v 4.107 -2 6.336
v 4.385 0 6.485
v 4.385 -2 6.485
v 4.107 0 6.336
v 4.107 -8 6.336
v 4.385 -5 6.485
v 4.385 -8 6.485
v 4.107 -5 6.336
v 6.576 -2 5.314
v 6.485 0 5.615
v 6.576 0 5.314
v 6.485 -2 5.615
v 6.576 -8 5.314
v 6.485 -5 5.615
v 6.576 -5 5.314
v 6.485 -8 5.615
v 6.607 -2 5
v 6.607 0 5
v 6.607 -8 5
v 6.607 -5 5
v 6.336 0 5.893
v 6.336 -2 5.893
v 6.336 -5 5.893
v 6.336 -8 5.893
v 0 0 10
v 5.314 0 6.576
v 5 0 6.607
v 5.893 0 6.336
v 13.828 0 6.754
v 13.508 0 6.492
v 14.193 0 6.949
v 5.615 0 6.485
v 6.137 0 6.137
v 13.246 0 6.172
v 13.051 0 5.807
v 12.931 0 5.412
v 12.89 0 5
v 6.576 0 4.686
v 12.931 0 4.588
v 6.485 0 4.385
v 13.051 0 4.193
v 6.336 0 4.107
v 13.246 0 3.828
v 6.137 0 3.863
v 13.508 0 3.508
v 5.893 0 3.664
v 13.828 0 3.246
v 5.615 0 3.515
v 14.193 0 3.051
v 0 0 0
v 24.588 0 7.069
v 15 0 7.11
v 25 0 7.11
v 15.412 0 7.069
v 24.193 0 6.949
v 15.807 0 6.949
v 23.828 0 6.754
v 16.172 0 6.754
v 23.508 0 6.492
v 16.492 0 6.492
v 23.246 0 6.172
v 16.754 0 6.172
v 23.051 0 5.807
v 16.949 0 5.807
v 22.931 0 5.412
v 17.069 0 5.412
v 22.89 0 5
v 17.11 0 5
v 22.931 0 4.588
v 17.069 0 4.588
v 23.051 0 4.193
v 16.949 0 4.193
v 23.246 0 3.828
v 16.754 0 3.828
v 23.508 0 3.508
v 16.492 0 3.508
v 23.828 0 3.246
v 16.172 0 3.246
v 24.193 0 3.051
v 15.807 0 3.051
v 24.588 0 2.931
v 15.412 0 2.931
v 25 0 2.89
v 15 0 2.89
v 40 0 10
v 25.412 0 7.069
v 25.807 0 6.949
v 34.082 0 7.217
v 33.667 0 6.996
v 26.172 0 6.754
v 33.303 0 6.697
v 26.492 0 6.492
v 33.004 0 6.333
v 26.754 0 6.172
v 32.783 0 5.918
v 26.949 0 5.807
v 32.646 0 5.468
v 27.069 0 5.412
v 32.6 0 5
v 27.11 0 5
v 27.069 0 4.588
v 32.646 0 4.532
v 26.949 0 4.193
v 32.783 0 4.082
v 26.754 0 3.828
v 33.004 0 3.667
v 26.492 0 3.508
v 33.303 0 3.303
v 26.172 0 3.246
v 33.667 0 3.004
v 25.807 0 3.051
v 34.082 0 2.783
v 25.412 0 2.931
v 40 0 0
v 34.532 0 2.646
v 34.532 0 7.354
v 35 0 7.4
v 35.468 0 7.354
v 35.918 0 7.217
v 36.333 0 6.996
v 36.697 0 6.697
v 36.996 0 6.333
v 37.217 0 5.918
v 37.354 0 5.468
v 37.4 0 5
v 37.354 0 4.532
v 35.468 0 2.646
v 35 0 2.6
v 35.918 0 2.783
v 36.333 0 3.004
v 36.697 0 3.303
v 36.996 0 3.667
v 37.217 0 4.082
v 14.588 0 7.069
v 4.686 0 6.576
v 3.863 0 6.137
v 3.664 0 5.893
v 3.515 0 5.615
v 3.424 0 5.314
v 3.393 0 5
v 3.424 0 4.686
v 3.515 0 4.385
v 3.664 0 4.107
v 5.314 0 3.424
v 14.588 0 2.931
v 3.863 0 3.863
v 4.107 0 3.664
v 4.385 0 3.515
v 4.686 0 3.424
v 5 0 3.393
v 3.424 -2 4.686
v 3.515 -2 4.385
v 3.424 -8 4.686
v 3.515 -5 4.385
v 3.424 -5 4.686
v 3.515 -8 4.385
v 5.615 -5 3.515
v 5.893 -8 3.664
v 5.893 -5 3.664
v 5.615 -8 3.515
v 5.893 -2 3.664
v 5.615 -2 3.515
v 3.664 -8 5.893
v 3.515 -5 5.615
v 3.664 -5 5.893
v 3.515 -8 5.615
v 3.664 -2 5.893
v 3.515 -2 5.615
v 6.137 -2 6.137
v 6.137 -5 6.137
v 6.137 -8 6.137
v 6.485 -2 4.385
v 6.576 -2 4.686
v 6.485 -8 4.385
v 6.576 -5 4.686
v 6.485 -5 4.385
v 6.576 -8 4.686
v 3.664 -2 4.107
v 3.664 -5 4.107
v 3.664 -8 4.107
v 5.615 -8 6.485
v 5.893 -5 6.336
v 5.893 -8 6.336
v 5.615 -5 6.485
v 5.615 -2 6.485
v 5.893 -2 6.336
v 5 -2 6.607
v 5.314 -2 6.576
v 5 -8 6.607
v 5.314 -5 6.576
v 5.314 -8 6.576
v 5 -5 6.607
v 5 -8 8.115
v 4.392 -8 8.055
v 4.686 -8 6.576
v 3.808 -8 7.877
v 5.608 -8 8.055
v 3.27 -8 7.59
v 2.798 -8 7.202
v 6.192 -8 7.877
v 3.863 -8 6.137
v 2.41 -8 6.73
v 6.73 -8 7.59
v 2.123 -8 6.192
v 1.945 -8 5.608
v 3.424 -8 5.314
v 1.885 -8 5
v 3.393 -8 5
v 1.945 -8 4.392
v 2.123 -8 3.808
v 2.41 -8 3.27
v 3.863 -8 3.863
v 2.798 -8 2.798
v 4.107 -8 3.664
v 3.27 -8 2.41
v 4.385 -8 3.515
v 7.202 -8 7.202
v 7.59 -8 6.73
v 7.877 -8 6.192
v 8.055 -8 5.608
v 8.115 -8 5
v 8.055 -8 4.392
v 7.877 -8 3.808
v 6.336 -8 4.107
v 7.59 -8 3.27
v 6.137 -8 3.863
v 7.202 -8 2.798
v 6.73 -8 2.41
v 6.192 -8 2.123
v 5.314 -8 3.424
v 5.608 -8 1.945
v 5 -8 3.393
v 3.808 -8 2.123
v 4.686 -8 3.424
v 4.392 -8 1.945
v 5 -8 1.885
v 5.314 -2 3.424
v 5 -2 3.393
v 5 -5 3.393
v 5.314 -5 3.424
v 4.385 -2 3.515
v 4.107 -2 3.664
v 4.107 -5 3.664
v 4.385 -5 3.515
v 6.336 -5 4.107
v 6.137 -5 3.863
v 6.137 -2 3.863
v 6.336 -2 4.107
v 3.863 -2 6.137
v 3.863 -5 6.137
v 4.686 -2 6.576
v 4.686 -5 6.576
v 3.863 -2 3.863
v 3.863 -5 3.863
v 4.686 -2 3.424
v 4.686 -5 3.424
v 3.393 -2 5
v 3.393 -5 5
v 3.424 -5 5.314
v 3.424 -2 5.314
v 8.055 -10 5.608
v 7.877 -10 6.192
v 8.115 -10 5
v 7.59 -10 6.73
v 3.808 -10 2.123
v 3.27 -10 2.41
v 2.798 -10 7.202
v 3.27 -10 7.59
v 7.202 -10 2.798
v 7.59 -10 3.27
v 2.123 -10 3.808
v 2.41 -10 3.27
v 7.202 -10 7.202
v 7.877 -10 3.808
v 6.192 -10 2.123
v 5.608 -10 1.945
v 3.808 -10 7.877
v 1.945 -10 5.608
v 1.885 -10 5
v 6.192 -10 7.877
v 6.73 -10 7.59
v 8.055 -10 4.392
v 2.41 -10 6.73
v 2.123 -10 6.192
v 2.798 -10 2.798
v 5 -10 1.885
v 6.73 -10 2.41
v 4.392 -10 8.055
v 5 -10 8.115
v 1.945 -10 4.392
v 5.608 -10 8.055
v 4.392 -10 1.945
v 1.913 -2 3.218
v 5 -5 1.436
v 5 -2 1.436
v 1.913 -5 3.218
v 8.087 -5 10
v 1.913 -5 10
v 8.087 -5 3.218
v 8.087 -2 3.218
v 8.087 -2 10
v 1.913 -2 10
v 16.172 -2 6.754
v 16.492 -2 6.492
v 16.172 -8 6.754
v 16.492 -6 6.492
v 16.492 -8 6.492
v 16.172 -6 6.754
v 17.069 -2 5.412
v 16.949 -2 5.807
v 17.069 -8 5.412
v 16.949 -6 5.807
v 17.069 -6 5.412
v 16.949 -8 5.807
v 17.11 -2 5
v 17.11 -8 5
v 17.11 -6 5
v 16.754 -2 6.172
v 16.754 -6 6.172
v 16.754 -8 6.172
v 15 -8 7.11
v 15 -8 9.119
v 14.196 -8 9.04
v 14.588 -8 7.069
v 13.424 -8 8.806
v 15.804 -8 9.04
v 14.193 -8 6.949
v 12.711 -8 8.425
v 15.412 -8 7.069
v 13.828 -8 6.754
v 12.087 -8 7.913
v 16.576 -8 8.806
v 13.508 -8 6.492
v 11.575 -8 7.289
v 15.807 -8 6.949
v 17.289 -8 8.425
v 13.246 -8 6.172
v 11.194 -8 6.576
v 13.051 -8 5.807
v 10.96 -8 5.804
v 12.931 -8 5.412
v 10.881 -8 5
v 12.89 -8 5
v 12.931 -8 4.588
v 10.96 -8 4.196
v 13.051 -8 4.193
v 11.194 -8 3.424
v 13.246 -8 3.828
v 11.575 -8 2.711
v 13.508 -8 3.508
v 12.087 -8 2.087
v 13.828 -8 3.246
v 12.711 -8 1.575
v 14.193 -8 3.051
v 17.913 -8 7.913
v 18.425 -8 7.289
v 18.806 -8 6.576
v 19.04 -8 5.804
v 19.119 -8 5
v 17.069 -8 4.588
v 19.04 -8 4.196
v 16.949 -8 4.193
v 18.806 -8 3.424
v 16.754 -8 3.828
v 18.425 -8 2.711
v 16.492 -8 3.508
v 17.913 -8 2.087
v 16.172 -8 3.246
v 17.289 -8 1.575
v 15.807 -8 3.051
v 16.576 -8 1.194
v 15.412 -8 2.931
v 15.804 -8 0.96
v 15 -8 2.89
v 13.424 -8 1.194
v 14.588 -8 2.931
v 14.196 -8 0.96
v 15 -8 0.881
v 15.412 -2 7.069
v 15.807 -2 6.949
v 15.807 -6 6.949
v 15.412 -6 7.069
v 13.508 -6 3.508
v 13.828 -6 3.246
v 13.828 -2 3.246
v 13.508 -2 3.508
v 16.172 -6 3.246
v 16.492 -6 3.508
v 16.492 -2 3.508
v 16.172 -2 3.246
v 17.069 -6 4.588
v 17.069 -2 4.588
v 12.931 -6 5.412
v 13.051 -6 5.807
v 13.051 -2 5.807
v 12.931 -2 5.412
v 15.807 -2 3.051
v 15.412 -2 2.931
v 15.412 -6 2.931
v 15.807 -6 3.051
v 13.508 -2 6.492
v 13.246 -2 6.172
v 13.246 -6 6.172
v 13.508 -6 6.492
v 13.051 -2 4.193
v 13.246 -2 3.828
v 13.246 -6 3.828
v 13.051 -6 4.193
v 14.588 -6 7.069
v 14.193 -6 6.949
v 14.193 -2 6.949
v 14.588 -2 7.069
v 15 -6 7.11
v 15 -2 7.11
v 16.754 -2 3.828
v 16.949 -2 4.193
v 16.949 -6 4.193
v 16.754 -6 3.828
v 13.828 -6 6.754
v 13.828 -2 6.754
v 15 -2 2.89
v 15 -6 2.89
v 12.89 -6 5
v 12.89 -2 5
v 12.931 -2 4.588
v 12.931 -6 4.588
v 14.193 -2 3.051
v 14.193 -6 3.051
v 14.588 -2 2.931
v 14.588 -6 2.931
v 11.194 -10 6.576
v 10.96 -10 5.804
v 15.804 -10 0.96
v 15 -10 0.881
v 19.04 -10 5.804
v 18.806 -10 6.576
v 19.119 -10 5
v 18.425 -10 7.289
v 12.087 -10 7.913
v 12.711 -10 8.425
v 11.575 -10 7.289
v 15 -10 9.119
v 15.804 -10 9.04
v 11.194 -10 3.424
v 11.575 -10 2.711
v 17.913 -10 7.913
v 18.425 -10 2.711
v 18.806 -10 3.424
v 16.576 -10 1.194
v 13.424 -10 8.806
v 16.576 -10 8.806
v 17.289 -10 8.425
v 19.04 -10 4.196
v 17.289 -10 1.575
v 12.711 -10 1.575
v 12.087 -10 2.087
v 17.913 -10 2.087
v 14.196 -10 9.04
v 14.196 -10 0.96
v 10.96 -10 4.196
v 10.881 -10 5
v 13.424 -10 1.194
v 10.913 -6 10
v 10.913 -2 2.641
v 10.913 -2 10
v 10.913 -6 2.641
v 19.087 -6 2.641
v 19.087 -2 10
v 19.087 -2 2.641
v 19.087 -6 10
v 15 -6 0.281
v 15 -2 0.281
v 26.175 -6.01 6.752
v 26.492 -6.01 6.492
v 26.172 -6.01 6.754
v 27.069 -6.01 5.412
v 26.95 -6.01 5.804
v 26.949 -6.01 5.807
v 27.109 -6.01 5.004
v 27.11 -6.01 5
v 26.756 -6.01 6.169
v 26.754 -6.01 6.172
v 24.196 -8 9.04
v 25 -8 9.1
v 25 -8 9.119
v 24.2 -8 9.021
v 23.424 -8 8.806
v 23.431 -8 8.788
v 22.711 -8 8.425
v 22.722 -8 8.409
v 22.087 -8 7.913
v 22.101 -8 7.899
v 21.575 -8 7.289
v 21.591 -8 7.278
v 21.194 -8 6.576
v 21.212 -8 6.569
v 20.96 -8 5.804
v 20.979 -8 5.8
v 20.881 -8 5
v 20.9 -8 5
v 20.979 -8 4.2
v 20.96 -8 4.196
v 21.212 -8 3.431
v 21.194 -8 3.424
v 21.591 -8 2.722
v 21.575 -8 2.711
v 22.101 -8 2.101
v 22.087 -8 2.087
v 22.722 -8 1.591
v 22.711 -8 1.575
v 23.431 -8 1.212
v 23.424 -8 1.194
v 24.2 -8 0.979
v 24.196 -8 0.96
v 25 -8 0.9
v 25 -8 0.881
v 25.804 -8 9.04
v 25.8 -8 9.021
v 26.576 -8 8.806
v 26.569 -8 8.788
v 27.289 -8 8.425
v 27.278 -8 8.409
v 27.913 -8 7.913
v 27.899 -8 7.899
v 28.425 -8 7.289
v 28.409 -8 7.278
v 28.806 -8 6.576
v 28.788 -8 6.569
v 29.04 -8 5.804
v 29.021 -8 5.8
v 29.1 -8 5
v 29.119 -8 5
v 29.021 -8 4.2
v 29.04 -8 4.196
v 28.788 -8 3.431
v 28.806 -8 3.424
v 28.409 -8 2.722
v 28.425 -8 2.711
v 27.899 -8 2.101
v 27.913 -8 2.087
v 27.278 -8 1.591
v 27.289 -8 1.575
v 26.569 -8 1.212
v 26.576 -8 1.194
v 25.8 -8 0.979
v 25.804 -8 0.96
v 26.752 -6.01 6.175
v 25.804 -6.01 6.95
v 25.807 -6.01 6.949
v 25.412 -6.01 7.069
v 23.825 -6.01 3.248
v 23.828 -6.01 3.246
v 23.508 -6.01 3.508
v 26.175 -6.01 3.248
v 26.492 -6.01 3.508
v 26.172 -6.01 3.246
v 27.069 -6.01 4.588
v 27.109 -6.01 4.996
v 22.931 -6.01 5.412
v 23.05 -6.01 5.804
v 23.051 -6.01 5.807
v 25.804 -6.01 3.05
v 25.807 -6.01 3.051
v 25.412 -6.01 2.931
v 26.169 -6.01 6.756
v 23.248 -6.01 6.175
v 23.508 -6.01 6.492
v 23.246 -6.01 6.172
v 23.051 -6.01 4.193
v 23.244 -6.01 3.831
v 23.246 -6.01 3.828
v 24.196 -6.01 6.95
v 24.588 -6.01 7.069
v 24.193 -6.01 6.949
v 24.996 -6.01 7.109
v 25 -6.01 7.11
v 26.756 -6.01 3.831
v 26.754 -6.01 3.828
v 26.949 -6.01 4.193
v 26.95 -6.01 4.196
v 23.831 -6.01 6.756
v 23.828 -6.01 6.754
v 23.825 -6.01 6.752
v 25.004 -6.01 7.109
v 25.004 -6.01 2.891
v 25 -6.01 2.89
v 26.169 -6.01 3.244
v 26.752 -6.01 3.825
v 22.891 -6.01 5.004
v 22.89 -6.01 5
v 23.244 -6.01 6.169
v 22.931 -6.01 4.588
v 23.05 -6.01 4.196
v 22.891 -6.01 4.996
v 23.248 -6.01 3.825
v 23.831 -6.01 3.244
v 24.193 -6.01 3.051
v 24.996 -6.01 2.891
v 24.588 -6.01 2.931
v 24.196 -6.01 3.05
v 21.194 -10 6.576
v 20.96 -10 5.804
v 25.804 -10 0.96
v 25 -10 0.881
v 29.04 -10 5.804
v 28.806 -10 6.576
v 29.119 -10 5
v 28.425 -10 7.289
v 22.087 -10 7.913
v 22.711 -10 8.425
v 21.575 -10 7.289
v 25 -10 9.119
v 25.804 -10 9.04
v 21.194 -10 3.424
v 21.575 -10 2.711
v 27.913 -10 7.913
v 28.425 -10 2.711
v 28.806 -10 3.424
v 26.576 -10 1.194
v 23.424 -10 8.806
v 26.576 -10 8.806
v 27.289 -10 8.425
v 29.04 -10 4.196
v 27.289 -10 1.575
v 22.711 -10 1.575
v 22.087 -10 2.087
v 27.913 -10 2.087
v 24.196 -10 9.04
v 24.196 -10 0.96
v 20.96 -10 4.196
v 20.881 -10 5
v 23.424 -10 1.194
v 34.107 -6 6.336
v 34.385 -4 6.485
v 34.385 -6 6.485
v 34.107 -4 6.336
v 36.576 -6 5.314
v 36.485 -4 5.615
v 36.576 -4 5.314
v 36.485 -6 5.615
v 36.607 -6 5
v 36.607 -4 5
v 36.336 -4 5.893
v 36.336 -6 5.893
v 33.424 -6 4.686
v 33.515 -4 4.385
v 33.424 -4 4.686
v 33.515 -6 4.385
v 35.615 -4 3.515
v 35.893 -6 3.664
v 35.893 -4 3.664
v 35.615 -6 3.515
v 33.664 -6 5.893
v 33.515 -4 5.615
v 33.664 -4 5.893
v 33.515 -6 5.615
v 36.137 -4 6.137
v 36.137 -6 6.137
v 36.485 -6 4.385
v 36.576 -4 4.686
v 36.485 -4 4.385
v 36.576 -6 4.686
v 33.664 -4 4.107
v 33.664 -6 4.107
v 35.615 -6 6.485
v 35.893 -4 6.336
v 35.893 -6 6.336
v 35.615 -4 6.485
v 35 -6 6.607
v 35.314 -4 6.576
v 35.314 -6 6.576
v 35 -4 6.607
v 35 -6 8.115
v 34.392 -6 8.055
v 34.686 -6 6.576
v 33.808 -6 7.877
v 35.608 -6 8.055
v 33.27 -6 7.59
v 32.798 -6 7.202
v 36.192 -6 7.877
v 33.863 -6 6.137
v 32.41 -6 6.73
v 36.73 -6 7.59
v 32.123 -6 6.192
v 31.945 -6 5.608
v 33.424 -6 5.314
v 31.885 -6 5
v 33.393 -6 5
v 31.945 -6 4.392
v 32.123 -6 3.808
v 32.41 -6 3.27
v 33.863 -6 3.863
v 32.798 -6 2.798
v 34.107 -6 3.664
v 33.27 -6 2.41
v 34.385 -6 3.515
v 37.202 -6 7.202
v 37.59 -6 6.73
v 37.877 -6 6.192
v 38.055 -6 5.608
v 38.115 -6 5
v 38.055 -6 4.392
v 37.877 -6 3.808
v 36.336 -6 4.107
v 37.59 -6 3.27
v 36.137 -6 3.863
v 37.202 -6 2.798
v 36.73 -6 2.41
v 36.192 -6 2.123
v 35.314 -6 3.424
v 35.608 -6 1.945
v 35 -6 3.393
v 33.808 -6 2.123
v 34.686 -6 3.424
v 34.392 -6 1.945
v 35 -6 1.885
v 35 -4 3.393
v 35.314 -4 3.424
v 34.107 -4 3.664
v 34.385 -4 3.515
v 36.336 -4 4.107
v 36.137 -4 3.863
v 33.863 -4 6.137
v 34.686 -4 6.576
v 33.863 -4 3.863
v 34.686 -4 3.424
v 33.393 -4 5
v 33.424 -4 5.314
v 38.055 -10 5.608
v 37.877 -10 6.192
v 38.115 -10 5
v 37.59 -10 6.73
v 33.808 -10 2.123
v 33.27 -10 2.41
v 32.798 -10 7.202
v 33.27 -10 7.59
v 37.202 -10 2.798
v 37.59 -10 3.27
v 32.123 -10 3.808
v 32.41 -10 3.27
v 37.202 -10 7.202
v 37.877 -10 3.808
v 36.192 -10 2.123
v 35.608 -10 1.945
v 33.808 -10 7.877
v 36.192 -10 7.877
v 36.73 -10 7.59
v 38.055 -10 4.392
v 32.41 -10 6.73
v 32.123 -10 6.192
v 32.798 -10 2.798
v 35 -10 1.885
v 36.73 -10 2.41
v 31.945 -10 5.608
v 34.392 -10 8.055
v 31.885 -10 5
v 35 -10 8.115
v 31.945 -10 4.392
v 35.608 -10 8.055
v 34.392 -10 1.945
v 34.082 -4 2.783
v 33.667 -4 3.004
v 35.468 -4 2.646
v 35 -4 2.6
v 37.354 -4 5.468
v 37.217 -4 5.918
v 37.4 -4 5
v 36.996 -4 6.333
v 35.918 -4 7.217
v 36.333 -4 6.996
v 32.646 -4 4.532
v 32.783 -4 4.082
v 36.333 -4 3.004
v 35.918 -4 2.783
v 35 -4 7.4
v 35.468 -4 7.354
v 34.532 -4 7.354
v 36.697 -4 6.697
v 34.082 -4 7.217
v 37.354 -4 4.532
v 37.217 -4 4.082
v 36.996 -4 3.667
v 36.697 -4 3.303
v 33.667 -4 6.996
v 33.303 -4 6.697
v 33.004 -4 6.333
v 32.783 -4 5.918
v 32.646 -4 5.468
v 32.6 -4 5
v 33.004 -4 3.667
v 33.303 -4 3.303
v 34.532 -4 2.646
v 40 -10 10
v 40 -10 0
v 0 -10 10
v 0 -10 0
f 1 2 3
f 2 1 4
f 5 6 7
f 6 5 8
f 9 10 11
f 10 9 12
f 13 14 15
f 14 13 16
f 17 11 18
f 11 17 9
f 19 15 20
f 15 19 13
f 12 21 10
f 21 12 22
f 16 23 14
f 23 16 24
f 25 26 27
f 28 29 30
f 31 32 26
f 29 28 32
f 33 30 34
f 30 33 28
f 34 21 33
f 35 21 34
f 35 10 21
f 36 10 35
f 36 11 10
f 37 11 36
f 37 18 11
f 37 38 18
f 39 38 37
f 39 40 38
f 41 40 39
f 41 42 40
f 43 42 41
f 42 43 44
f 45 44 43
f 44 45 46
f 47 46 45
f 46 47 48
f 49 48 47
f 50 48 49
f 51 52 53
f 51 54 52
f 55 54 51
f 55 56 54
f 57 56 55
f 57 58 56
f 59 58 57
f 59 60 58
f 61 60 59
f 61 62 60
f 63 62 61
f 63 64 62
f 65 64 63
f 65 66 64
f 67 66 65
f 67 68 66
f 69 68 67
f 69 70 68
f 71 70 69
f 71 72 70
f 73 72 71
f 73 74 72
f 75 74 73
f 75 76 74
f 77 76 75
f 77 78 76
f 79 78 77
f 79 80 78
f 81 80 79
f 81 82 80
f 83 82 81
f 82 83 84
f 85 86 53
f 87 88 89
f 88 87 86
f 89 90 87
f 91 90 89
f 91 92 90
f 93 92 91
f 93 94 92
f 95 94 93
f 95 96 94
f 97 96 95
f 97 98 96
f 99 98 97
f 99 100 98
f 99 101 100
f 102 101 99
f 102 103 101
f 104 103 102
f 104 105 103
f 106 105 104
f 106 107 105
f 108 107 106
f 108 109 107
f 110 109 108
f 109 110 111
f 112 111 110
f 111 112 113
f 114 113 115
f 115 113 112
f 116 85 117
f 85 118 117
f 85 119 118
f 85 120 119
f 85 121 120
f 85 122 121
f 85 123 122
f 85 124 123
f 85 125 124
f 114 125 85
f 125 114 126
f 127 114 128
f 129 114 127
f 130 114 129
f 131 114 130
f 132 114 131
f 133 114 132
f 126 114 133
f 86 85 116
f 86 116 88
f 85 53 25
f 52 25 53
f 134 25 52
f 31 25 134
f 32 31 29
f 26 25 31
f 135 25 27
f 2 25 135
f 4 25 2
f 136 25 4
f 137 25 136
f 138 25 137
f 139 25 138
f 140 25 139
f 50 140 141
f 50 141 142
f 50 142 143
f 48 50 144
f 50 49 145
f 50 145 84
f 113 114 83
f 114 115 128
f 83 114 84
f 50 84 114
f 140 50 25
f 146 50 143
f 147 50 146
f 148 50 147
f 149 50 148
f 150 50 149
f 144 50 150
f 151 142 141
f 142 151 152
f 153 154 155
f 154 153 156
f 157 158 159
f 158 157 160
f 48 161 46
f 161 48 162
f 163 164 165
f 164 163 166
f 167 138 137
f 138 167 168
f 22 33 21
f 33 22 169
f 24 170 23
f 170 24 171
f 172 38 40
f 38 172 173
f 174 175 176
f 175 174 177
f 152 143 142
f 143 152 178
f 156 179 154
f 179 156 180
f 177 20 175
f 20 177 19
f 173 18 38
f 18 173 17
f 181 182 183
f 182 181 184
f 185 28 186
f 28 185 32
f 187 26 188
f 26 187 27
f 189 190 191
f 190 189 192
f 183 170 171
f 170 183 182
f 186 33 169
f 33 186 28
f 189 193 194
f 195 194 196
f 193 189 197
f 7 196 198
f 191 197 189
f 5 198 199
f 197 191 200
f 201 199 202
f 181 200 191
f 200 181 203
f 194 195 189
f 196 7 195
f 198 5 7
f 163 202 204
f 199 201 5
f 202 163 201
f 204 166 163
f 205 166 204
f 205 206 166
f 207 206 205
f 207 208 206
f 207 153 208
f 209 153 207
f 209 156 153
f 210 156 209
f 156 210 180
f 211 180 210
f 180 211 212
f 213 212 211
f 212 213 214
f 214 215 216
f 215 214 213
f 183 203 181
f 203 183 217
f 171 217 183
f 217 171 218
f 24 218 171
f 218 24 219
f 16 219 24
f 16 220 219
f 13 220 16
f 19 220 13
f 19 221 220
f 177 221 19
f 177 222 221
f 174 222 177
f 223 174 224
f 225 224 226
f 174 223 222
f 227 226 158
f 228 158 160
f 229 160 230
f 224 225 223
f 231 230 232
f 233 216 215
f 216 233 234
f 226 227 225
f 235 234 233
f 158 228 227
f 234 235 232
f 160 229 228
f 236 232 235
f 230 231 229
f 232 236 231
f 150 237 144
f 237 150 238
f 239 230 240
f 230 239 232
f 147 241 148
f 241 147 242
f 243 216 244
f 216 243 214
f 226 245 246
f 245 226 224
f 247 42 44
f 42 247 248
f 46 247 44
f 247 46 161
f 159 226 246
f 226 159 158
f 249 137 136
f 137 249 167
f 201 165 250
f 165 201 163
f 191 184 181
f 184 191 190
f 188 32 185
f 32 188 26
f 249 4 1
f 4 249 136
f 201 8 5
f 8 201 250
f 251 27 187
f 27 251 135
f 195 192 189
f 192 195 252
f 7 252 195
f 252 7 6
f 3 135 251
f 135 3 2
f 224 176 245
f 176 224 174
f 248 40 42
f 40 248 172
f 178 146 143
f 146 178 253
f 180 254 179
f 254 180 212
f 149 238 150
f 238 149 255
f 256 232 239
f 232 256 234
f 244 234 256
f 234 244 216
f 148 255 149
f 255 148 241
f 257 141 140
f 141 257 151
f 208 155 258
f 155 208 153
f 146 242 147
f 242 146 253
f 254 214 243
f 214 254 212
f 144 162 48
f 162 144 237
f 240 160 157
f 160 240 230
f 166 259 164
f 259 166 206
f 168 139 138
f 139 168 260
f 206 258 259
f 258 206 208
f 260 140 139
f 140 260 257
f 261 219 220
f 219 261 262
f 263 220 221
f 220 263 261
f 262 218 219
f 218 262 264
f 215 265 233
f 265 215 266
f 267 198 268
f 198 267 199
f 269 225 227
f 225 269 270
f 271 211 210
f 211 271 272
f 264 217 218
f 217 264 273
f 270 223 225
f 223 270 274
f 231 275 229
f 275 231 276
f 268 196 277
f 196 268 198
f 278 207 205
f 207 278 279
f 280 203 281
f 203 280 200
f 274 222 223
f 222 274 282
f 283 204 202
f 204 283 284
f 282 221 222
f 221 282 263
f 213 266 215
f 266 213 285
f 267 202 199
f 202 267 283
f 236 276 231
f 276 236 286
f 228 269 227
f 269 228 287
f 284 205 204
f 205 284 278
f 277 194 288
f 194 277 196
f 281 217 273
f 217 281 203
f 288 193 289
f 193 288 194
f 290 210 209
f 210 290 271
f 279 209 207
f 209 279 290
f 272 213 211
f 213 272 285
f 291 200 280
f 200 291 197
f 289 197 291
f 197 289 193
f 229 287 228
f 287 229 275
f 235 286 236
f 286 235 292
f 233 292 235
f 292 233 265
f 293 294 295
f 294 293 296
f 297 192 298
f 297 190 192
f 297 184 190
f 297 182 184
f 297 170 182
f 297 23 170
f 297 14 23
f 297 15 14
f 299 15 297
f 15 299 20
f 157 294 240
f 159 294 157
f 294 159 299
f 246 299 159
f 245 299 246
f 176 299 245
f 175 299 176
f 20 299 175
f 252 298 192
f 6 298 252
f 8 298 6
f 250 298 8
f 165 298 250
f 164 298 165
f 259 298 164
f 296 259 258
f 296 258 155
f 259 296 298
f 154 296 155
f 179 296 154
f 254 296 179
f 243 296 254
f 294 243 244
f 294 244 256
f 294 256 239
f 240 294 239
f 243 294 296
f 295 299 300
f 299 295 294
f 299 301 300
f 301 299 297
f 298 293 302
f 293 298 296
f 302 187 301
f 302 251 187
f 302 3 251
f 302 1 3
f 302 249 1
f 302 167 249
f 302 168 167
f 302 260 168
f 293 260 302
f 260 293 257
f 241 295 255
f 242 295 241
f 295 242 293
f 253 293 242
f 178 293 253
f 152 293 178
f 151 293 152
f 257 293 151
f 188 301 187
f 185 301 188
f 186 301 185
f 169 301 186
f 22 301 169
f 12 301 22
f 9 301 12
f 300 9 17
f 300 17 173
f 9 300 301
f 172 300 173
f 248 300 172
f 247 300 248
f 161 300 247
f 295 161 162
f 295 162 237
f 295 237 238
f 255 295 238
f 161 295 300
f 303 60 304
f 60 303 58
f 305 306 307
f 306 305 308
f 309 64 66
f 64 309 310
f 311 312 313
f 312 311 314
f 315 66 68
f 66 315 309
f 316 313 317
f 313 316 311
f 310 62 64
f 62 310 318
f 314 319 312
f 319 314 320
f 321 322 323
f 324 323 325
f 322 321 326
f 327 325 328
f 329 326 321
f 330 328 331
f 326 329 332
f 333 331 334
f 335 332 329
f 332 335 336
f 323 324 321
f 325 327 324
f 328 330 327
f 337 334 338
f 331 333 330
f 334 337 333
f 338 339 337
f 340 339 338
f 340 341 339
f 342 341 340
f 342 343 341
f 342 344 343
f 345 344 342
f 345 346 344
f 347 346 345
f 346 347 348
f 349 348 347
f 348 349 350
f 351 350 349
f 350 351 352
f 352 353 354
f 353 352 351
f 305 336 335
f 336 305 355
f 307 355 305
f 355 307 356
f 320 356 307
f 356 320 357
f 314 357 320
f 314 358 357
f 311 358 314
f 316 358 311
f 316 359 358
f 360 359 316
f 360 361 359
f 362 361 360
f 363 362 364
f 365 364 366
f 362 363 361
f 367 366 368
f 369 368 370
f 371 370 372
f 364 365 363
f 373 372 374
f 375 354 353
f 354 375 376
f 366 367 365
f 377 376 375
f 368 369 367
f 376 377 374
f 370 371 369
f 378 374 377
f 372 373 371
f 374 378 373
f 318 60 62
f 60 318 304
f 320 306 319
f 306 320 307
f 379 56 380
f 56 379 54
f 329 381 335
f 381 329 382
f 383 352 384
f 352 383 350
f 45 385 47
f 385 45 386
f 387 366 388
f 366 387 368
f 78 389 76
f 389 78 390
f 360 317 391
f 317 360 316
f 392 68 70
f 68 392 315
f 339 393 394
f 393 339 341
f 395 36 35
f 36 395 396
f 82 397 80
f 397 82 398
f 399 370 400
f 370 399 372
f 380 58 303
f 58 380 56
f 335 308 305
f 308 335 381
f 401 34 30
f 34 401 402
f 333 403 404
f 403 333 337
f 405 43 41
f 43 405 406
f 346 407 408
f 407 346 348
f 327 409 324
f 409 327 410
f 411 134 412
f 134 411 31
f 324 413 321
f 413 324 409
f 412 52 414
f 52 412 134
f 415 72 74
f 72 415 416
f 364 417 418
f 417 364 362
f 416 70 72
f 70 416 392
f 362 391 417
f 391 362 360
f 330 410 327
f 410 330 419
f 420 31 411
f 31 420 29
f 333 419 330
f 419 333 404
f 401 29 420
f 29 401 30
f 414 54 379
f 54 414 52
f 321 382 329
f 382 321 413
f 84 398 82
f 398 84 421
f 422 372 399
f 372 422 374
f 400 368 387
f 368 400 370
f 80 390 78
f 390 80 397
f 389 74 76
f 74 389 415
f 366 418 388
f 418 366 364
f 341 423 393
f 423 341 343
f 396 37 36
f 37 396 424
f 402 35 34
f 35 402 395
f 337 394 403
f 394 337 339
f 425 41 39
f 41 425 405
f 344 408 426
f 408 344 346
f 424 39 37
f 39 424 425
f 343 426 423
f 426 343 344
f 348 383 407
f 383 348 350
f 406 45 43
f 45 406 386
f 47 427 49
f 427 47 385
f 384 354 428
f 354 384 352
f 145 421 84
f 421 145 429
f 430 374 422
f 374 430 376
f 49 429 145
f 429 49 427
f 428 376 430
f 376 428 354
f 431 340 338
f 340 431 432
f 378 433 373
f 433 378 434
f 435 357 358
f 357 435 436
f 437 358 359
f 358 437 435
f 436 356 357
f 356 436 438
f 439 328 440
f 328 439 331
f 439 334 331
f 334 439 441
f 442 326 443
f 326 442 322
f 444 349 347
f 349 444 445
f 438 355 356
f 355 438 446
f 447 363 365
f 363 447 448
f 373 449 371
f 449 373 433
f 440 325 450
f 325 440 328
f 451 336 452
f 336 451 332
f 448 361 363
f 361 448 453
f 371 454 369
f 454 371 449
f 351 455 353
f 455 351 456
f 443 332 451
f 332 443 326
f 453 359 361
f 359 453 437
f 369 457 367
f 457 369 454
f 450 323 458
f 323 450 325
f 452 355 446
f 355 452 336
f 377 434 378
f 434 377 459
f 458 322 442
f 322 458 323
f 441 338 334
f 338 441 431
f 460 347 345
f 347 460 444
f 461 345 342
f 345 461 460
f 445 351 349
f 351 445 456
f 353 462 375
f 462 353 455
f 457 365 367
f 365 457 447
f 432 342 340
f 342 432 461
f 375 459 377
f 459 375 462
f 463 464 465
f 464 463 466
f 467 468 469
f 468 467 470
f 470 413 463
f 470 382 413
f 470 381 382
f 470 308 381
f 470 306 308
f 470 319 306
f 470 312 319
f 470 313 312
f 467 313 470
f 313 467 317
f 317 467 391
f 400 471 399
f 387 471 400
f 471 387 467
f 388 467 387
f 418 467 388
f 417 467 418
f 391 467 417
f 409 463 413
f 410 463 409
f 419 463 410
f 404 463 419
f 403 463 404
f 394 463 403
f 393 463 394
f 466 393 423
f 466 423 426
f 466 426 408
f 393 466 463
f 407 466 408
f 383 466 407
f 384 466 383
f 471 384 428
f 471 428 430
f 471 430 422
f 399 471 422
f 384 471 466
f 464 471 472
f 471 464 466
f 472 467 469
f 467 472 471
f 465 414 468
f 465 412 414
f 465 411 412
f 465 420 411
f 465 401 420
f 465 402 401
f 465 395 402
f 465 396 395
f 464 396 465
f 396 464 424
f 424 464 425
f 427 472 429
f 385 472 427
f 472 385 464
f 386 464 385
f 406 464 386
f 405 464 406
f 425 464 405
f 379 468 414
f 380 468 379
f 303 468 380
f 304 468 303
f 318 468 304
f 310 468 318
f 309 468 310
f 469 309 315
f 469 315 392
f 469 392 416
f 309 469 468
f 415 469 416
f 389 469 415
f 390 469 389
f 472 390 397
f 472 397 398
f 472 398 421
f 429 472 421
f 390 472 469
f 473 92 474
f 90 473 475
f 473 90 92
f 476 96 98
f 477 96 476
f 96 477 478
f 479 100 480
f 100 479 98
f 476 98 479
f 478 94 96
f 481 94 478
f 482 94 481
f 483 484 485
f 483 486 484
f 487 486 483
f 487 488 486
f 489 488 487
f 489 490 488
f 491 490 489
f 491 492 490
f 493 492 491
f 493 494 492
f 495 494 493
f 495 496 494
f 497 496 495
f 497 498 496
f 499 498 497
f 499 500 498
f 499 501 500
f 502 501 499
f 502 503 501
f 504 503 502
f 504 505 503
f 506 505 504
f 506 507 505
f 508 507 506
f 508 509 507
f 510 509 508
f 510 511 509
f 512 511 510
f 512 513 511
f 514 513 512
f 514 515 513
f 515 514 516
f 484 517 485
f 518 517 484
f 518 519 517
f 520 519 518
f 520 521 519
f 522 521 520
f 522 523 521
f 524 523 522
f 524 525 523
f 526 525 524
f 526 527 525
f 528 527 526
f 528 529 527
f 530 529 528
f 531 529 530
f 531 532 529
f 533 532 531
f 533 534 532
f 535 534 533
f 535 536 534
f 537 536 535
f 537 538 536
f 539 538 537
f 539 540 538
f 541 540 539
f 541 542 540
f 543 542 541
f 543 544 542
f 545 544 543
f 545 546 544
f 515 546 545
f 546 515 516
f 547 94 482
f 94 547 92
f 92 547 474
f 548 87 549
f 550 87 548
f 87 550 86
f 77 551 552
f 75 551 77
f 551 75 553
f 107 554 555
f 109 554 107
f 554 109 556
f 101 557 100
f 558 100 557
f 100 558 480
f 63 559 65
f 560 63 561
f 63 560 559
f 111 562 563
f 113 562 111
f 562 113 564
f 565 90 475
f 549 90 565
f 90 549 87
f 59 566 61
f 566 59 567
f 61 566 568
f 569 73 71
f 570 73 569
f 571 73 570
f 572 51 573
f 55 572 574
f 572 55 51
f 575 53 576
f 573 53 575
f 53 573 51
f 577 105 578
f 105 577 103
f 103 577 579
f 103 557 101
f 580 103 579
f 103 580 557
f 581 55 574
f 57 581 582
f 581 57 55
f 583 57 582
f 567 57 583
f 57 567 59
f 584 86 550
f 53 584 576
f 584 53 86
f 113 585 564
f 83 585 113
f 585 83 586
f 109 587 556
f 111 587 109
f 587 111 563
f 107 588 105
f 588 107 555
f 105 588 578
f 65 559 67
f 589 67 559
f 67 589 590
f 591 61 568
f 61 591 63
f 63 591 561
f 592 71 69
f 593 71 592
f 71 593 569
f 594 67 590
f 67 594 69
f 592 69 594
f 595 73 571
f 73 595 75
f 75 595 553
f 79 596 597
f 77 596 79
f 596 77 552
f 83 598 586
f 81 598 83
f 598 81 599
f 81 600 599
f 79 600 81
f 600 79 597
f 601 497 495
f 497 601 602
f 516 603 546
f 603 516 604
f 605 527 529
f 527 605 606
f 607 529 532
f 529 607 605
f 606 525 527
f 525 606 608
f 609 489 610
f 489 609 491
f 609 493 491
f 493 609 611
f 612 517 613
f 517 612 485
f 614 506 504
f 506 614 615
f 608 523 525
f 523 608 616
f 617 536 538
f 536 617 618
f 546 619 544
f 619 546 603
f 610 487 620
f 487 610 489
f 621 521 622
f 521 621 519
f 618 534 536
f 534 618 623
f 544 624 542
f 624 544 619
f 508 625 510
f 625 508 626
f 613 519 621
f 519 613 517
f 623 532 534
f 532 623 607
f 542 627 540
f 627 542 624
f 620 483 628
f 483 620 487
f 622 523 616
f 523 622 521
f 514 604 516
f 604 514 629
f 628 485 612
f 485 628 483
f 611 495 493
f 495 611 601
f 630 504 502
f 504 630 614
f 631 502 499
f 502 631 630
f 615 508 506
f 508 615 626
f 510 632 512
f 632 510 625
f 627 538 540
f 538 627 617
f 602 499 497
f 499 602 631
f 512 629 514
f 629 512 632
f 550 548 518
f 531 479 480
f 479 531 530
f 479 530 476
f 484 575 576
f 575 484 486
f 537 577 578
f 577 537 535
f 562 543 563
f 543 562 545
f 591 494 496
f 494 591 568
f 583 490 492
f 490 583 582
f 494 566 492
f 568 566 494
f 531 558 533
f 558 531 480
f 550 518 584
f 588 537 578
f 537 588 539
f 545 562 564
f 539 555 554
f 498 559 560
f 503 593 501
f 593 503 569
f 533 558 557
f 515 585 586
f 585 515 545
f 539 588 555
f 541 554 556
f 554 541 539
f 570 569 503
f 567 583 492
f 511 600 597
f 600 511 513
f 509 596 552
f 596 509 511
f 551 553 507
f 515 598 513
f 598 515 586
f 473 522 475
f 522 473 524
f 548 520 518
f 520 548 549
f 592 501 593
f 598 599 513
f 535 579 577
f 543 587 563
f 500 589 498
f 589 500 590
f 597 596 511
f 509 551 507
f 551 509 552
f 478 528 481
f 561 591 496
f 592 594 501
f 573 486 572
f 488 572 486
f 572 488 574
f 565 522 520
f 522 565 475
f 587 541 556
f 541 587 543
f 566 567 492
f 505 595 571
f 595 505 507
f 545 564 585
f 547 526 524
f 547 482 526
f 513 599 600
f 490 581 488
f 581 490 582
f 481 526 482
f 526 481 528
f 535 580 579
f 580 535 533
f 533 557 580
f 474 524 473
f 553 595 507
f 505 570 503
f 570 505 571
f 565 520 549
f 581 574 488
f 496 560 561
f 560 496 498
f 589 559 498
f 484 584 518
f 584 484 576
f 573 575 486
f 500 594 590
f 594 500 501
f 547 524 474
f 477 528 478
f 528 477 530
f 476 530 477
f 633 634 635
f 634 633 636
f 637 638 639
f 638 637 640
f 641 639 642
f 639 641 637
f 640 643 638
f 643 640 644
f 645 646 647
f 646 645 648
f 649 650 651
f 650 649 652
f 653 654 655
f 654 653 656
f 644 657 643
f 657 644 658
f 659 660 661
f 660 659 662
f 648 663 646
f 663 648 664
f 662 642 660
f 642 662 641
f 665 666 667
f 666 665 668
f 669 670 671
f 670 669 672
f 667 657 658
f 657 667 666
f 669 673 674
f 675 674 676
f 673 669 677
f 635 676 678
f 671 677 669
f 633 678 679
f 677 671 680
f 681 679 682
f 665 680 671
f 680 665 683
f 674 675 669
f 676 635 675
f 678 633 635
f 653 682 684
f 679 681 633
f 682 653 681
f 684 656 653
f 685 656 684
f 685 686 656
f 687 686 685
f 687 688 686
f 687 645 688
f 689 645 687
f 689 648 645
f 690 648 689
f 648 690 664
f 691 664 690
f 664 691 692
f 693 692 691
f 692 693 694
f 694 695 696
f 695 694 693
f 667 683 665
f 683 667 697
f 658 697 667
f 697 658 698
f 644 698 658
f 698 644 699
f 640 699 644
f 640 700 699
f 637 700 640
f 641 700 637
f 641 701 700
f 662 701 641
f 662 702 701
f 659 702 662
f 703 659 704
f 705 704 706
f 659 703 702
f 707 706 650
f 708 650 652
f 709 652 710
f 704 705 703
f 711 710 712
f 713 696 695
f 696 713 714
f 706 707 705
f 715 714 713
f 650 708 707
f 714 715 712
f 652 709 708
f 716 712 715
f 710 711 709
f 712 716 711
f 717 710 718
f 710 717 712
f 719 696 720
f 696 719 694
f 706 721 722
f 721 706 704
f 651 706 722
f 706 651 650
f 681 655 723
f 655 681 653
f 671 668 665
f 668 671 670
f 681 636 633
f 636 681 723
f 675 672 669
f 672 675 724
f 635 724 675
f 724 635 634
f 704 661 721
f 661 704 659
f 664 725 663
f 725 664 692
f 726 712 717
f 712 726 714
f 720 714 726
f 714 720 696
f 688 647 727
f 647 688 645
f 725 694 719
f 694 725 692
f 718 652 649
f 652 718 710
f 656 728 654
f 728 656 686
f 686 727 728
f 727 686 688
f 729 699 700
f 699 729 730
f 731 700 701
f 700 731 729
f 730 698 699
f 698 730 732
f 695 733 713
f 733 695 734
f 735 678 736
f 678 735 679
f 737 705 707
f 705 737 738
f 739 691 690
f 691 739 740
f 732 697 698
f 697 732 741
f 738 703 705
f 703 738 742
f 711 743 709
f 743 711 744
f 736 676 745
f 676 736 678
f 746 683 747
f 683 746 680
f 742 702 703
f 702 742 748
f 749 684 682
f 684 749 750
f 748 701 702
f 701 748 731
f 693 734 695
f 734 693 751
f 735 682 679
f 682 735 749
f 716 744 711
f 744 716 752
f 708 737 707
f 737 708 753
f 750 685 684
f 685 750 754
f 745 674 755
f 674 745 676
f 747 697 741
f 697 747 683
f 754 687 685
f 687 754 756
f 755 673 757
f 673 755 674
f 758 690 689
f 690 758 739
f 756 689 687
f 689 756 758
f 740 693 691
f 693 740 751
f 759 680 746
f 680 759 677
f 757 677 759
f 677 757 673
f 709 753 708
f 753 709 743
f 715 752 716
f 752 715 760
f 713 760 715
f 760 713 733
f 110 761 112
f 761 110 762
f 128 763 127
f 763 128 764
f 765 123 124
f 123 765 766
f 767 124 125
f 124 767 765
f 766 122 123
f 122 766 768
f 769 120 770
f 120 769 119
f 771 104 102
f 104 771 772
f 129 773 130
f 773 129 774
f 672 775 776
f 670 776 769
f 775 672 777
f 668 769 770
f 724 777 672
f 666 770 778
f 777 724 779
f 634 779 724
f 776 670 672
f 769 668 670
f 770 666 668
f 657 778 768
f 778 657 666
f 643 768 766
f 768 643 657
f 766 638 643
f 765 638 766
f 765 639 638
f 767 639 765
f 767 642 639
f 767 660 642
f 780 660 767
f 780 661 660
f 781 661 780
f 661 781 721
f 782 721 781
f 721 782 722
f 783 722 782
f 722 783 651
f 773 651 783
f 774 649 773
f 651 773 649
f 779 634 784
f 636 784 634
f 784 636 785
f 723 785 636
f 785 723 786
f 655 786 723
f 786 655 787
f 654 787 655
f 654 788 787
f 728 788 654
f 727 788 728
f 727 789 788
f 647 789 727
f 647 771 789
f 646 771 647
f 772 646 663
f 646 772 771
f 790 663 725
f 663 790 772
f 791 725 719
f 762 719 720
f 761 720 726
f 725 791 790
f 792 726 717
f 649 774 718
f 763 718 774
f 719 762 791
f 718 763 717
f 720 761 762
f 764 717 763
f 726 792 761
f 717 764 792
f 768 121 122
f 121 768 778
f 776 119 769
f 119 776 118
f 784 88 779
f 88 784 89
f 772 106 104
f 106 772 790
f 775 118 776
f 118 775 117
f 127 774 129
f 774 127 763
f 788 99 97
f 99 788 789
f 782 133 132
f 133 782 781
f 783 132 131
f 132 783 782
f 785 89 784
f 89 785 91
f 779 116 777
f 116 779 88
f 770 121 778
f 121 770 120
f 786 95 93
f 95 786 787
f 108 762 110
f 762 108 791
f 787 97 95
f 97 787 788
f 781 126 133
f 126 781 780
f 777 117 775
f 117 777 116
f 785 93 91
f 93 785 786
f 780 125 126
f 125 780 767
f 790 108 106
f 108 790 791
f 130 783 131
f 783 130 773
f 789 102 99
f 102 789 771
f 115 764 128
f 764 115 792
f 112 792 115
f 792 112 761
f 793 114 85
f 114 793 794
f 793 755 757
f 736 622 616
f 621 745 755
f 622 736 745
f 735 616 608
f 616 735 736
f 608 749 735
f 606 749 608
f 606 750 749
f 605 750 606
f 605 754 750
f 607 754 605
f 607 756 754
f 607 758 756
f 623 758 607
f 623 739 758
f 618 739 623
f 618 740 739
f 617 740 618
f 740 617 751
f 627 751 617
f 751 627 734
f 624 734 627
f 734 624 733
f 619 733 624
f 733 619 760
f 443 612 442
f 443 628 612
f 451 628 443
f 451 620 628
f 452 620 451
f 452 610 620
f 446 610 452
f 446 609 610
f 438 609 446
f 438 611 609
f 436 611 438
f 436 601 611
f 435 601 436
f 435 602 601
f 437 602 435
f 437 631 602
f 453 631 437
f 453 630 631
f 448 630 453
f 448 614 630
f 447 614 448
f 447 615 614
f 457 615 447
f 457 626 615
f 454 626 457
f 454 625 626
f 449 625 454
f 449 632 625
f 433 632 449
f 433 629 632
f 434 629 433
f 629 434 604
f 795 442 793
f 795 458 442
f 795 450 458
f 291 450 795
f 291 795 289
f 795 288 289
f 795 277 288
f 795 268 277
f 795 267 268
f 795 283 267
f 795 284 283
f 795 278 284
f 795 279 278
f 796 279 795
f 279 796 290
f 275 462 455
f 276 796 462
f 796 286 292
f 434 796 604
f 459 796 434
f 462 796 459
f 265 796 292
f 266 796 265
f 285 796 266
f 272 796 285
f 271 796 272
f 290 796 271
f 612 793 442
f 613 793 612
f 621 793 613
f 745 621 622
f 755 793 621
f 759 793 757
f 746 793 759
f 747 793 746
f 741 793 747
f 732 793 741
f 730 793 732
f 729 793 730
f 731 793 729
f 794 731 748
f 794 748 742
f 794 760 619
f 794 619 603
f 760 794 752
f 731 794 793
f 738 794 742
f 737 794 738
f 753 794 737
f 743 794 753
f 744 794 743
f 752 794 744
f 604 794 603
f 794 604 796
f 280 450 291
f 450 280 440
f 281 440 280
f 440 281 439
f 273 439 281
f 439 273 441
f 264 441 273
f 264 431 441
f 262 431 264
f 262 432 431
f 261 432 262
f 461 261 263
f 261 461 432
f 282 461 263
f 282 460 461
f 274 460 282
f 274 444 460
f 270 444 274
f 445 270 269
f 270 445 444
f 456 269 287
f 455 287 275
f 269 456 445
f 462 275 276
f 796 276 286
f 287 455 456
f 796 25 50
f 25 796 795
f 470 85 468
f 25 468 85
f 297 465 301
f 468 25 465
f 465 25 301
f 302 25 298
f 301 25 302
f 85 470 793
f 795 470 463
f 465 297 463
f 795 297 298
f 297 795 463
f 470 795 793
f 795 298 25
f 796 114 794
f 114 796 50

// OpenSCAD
$radial_error = 0.1;

$fn = $preview ? 12 : 32;

ISO262_COARSE_PITCH = [
	[1.0, 0.25],
	[1.2, 0.25],
	[1.4, 0.2],
	[1.6, 0.35],
	[1.8, 0.2],
	[2.0, 0.4],
	[2.5, 0.45],
	[3.0, 0.5],
	[3.5, 0.35],
	[4.0, 0.7],
	[5.0, 0.8],
	[6.0, 1.0],
	[7.0, 0.75],
	[8.0, 1.25],
	[10.0, 1.5],
	[12.0, 1.75],
	[14.0, 1.5],
	[16.0, 2.0],
	[30.0, 3.5],
	[42.0, 4.5],
	[56.0, 5.5]
];

function screw_pitch(d) = lookup(d, ISO262_COARSE_PITCH);

module cylinder_outer(height, radius, fn=$fn, radial_error=$radial_error) {
	fudge = 1/cos(180/fn);
	cylinder(h=height,r=radius*fudge+$radial_error, $fn=fn);
}

module cylinder_inner(height, radius, fn=$fn) {
	cylinder(h=height,r=radius-$radial_error,$fn=fn);
}

// Make a hole. The diameter is the size of the screw (e.g. 3 for M3). Depth is how far the hole should go for the thread, and inset is how far out there should be a hole for the head to go.
module hole(diameter=3, depth=6, inset=10, pitch=0) {
	cylinder_outer(depth, (diameter-pitch)/2);
	translate([0, 0, depth]) cylinder_outer(inset, diameter, 32);
}

module threaded_hole(diameter=3, depth=6, inset=10) {
	hole(diameter, depth, inset, screw_pitch(diameter));
}

module countersunk_hole(diameter=3, depth=6, inset=10, pitch=0) {
	hole(diameter, depth, inset, pitch);
	translate([0, 0, depth-diameter/2]) cylinder(r1=diameter/2+$radial_error, r2=diameter+$radial_error, h=diameter/2);
}

module knurled_insert(diameter = 3, depth = 6, thickness = 1) {
	cylinder_inner(depth, diameter/2 + thickness);
}

module knurled_hole(diameter = 3, depth = 6, inset = 10, insert = 4, thickness = 1) {
	hole(diameter, depth, inset);
	
	knurled_insert(diameter, insert, thickness);
}

module countersunk_knurled_hole(diameter = 3, depth = 6, inset = 10, insert = 4, thickness = 1) {
	countersunk_hole(diameter, depth, inset);
	
	knurled_insert(diameter, insert, thickness);
}

// Make a hole for a bolt/screw combination.
module bolted_hole(diameter=3, depth=8, nut_offset=2, shaft_length=10, inset=10) {
	hole(diameter, depth, inset);
	hull() {
		shaft_width = diameter;
		translate([0, 0, nut_offset]) rotate(360/12, [0, 0, 1]) cylinder_outer(diameter, shaft_width, 6);
		translate([0, shaft_length, nut_offset]) rotate(360/12, [0, 0, 1]) cylinder_outer(diameter, shaft_width, 6);
	}
}

module countersunk_bolted_hole(diameter=3, depth=8, nut_offset=2, shaft_length=10, inset=10) {
	countersunk_hole(diameter, depth, inset);
	hull() {
		shaft_width = diameter;
		translate([0, 0, nut_offset]) rotate(360/12, [0, 0, 1]) cylinder_outer(diameter, shaft_width, 6);
		translate([0, shaft_length, nut_offset]) rotate(360/12, [0, 0, 1]) cylinder_outer(diameter, shaft_width, 6);
	}
}

module mounting_hole(diameter=3, depth=6, inset=10, outset=3) {
	difference() {
		cylinder_outer(depth, diameter/2+outset);
		hole(diameter=diameter, depth=depth, inset=inset);
	}
}

render() rotate(90, [1, 0, 0]) difference() {
	cube([40, 10, 10]);
	translate([5, 5, 0]) bolted_hole(diameter=3, depth=8);
	translate([15, 5, 0]) bolted_hole(diameter=4, depth=8);
	translate([25, 5, 0]) countersunk_hole(diameter=4, depth=8);
	translate([35, 5, 0]) knurled_hole();
}
